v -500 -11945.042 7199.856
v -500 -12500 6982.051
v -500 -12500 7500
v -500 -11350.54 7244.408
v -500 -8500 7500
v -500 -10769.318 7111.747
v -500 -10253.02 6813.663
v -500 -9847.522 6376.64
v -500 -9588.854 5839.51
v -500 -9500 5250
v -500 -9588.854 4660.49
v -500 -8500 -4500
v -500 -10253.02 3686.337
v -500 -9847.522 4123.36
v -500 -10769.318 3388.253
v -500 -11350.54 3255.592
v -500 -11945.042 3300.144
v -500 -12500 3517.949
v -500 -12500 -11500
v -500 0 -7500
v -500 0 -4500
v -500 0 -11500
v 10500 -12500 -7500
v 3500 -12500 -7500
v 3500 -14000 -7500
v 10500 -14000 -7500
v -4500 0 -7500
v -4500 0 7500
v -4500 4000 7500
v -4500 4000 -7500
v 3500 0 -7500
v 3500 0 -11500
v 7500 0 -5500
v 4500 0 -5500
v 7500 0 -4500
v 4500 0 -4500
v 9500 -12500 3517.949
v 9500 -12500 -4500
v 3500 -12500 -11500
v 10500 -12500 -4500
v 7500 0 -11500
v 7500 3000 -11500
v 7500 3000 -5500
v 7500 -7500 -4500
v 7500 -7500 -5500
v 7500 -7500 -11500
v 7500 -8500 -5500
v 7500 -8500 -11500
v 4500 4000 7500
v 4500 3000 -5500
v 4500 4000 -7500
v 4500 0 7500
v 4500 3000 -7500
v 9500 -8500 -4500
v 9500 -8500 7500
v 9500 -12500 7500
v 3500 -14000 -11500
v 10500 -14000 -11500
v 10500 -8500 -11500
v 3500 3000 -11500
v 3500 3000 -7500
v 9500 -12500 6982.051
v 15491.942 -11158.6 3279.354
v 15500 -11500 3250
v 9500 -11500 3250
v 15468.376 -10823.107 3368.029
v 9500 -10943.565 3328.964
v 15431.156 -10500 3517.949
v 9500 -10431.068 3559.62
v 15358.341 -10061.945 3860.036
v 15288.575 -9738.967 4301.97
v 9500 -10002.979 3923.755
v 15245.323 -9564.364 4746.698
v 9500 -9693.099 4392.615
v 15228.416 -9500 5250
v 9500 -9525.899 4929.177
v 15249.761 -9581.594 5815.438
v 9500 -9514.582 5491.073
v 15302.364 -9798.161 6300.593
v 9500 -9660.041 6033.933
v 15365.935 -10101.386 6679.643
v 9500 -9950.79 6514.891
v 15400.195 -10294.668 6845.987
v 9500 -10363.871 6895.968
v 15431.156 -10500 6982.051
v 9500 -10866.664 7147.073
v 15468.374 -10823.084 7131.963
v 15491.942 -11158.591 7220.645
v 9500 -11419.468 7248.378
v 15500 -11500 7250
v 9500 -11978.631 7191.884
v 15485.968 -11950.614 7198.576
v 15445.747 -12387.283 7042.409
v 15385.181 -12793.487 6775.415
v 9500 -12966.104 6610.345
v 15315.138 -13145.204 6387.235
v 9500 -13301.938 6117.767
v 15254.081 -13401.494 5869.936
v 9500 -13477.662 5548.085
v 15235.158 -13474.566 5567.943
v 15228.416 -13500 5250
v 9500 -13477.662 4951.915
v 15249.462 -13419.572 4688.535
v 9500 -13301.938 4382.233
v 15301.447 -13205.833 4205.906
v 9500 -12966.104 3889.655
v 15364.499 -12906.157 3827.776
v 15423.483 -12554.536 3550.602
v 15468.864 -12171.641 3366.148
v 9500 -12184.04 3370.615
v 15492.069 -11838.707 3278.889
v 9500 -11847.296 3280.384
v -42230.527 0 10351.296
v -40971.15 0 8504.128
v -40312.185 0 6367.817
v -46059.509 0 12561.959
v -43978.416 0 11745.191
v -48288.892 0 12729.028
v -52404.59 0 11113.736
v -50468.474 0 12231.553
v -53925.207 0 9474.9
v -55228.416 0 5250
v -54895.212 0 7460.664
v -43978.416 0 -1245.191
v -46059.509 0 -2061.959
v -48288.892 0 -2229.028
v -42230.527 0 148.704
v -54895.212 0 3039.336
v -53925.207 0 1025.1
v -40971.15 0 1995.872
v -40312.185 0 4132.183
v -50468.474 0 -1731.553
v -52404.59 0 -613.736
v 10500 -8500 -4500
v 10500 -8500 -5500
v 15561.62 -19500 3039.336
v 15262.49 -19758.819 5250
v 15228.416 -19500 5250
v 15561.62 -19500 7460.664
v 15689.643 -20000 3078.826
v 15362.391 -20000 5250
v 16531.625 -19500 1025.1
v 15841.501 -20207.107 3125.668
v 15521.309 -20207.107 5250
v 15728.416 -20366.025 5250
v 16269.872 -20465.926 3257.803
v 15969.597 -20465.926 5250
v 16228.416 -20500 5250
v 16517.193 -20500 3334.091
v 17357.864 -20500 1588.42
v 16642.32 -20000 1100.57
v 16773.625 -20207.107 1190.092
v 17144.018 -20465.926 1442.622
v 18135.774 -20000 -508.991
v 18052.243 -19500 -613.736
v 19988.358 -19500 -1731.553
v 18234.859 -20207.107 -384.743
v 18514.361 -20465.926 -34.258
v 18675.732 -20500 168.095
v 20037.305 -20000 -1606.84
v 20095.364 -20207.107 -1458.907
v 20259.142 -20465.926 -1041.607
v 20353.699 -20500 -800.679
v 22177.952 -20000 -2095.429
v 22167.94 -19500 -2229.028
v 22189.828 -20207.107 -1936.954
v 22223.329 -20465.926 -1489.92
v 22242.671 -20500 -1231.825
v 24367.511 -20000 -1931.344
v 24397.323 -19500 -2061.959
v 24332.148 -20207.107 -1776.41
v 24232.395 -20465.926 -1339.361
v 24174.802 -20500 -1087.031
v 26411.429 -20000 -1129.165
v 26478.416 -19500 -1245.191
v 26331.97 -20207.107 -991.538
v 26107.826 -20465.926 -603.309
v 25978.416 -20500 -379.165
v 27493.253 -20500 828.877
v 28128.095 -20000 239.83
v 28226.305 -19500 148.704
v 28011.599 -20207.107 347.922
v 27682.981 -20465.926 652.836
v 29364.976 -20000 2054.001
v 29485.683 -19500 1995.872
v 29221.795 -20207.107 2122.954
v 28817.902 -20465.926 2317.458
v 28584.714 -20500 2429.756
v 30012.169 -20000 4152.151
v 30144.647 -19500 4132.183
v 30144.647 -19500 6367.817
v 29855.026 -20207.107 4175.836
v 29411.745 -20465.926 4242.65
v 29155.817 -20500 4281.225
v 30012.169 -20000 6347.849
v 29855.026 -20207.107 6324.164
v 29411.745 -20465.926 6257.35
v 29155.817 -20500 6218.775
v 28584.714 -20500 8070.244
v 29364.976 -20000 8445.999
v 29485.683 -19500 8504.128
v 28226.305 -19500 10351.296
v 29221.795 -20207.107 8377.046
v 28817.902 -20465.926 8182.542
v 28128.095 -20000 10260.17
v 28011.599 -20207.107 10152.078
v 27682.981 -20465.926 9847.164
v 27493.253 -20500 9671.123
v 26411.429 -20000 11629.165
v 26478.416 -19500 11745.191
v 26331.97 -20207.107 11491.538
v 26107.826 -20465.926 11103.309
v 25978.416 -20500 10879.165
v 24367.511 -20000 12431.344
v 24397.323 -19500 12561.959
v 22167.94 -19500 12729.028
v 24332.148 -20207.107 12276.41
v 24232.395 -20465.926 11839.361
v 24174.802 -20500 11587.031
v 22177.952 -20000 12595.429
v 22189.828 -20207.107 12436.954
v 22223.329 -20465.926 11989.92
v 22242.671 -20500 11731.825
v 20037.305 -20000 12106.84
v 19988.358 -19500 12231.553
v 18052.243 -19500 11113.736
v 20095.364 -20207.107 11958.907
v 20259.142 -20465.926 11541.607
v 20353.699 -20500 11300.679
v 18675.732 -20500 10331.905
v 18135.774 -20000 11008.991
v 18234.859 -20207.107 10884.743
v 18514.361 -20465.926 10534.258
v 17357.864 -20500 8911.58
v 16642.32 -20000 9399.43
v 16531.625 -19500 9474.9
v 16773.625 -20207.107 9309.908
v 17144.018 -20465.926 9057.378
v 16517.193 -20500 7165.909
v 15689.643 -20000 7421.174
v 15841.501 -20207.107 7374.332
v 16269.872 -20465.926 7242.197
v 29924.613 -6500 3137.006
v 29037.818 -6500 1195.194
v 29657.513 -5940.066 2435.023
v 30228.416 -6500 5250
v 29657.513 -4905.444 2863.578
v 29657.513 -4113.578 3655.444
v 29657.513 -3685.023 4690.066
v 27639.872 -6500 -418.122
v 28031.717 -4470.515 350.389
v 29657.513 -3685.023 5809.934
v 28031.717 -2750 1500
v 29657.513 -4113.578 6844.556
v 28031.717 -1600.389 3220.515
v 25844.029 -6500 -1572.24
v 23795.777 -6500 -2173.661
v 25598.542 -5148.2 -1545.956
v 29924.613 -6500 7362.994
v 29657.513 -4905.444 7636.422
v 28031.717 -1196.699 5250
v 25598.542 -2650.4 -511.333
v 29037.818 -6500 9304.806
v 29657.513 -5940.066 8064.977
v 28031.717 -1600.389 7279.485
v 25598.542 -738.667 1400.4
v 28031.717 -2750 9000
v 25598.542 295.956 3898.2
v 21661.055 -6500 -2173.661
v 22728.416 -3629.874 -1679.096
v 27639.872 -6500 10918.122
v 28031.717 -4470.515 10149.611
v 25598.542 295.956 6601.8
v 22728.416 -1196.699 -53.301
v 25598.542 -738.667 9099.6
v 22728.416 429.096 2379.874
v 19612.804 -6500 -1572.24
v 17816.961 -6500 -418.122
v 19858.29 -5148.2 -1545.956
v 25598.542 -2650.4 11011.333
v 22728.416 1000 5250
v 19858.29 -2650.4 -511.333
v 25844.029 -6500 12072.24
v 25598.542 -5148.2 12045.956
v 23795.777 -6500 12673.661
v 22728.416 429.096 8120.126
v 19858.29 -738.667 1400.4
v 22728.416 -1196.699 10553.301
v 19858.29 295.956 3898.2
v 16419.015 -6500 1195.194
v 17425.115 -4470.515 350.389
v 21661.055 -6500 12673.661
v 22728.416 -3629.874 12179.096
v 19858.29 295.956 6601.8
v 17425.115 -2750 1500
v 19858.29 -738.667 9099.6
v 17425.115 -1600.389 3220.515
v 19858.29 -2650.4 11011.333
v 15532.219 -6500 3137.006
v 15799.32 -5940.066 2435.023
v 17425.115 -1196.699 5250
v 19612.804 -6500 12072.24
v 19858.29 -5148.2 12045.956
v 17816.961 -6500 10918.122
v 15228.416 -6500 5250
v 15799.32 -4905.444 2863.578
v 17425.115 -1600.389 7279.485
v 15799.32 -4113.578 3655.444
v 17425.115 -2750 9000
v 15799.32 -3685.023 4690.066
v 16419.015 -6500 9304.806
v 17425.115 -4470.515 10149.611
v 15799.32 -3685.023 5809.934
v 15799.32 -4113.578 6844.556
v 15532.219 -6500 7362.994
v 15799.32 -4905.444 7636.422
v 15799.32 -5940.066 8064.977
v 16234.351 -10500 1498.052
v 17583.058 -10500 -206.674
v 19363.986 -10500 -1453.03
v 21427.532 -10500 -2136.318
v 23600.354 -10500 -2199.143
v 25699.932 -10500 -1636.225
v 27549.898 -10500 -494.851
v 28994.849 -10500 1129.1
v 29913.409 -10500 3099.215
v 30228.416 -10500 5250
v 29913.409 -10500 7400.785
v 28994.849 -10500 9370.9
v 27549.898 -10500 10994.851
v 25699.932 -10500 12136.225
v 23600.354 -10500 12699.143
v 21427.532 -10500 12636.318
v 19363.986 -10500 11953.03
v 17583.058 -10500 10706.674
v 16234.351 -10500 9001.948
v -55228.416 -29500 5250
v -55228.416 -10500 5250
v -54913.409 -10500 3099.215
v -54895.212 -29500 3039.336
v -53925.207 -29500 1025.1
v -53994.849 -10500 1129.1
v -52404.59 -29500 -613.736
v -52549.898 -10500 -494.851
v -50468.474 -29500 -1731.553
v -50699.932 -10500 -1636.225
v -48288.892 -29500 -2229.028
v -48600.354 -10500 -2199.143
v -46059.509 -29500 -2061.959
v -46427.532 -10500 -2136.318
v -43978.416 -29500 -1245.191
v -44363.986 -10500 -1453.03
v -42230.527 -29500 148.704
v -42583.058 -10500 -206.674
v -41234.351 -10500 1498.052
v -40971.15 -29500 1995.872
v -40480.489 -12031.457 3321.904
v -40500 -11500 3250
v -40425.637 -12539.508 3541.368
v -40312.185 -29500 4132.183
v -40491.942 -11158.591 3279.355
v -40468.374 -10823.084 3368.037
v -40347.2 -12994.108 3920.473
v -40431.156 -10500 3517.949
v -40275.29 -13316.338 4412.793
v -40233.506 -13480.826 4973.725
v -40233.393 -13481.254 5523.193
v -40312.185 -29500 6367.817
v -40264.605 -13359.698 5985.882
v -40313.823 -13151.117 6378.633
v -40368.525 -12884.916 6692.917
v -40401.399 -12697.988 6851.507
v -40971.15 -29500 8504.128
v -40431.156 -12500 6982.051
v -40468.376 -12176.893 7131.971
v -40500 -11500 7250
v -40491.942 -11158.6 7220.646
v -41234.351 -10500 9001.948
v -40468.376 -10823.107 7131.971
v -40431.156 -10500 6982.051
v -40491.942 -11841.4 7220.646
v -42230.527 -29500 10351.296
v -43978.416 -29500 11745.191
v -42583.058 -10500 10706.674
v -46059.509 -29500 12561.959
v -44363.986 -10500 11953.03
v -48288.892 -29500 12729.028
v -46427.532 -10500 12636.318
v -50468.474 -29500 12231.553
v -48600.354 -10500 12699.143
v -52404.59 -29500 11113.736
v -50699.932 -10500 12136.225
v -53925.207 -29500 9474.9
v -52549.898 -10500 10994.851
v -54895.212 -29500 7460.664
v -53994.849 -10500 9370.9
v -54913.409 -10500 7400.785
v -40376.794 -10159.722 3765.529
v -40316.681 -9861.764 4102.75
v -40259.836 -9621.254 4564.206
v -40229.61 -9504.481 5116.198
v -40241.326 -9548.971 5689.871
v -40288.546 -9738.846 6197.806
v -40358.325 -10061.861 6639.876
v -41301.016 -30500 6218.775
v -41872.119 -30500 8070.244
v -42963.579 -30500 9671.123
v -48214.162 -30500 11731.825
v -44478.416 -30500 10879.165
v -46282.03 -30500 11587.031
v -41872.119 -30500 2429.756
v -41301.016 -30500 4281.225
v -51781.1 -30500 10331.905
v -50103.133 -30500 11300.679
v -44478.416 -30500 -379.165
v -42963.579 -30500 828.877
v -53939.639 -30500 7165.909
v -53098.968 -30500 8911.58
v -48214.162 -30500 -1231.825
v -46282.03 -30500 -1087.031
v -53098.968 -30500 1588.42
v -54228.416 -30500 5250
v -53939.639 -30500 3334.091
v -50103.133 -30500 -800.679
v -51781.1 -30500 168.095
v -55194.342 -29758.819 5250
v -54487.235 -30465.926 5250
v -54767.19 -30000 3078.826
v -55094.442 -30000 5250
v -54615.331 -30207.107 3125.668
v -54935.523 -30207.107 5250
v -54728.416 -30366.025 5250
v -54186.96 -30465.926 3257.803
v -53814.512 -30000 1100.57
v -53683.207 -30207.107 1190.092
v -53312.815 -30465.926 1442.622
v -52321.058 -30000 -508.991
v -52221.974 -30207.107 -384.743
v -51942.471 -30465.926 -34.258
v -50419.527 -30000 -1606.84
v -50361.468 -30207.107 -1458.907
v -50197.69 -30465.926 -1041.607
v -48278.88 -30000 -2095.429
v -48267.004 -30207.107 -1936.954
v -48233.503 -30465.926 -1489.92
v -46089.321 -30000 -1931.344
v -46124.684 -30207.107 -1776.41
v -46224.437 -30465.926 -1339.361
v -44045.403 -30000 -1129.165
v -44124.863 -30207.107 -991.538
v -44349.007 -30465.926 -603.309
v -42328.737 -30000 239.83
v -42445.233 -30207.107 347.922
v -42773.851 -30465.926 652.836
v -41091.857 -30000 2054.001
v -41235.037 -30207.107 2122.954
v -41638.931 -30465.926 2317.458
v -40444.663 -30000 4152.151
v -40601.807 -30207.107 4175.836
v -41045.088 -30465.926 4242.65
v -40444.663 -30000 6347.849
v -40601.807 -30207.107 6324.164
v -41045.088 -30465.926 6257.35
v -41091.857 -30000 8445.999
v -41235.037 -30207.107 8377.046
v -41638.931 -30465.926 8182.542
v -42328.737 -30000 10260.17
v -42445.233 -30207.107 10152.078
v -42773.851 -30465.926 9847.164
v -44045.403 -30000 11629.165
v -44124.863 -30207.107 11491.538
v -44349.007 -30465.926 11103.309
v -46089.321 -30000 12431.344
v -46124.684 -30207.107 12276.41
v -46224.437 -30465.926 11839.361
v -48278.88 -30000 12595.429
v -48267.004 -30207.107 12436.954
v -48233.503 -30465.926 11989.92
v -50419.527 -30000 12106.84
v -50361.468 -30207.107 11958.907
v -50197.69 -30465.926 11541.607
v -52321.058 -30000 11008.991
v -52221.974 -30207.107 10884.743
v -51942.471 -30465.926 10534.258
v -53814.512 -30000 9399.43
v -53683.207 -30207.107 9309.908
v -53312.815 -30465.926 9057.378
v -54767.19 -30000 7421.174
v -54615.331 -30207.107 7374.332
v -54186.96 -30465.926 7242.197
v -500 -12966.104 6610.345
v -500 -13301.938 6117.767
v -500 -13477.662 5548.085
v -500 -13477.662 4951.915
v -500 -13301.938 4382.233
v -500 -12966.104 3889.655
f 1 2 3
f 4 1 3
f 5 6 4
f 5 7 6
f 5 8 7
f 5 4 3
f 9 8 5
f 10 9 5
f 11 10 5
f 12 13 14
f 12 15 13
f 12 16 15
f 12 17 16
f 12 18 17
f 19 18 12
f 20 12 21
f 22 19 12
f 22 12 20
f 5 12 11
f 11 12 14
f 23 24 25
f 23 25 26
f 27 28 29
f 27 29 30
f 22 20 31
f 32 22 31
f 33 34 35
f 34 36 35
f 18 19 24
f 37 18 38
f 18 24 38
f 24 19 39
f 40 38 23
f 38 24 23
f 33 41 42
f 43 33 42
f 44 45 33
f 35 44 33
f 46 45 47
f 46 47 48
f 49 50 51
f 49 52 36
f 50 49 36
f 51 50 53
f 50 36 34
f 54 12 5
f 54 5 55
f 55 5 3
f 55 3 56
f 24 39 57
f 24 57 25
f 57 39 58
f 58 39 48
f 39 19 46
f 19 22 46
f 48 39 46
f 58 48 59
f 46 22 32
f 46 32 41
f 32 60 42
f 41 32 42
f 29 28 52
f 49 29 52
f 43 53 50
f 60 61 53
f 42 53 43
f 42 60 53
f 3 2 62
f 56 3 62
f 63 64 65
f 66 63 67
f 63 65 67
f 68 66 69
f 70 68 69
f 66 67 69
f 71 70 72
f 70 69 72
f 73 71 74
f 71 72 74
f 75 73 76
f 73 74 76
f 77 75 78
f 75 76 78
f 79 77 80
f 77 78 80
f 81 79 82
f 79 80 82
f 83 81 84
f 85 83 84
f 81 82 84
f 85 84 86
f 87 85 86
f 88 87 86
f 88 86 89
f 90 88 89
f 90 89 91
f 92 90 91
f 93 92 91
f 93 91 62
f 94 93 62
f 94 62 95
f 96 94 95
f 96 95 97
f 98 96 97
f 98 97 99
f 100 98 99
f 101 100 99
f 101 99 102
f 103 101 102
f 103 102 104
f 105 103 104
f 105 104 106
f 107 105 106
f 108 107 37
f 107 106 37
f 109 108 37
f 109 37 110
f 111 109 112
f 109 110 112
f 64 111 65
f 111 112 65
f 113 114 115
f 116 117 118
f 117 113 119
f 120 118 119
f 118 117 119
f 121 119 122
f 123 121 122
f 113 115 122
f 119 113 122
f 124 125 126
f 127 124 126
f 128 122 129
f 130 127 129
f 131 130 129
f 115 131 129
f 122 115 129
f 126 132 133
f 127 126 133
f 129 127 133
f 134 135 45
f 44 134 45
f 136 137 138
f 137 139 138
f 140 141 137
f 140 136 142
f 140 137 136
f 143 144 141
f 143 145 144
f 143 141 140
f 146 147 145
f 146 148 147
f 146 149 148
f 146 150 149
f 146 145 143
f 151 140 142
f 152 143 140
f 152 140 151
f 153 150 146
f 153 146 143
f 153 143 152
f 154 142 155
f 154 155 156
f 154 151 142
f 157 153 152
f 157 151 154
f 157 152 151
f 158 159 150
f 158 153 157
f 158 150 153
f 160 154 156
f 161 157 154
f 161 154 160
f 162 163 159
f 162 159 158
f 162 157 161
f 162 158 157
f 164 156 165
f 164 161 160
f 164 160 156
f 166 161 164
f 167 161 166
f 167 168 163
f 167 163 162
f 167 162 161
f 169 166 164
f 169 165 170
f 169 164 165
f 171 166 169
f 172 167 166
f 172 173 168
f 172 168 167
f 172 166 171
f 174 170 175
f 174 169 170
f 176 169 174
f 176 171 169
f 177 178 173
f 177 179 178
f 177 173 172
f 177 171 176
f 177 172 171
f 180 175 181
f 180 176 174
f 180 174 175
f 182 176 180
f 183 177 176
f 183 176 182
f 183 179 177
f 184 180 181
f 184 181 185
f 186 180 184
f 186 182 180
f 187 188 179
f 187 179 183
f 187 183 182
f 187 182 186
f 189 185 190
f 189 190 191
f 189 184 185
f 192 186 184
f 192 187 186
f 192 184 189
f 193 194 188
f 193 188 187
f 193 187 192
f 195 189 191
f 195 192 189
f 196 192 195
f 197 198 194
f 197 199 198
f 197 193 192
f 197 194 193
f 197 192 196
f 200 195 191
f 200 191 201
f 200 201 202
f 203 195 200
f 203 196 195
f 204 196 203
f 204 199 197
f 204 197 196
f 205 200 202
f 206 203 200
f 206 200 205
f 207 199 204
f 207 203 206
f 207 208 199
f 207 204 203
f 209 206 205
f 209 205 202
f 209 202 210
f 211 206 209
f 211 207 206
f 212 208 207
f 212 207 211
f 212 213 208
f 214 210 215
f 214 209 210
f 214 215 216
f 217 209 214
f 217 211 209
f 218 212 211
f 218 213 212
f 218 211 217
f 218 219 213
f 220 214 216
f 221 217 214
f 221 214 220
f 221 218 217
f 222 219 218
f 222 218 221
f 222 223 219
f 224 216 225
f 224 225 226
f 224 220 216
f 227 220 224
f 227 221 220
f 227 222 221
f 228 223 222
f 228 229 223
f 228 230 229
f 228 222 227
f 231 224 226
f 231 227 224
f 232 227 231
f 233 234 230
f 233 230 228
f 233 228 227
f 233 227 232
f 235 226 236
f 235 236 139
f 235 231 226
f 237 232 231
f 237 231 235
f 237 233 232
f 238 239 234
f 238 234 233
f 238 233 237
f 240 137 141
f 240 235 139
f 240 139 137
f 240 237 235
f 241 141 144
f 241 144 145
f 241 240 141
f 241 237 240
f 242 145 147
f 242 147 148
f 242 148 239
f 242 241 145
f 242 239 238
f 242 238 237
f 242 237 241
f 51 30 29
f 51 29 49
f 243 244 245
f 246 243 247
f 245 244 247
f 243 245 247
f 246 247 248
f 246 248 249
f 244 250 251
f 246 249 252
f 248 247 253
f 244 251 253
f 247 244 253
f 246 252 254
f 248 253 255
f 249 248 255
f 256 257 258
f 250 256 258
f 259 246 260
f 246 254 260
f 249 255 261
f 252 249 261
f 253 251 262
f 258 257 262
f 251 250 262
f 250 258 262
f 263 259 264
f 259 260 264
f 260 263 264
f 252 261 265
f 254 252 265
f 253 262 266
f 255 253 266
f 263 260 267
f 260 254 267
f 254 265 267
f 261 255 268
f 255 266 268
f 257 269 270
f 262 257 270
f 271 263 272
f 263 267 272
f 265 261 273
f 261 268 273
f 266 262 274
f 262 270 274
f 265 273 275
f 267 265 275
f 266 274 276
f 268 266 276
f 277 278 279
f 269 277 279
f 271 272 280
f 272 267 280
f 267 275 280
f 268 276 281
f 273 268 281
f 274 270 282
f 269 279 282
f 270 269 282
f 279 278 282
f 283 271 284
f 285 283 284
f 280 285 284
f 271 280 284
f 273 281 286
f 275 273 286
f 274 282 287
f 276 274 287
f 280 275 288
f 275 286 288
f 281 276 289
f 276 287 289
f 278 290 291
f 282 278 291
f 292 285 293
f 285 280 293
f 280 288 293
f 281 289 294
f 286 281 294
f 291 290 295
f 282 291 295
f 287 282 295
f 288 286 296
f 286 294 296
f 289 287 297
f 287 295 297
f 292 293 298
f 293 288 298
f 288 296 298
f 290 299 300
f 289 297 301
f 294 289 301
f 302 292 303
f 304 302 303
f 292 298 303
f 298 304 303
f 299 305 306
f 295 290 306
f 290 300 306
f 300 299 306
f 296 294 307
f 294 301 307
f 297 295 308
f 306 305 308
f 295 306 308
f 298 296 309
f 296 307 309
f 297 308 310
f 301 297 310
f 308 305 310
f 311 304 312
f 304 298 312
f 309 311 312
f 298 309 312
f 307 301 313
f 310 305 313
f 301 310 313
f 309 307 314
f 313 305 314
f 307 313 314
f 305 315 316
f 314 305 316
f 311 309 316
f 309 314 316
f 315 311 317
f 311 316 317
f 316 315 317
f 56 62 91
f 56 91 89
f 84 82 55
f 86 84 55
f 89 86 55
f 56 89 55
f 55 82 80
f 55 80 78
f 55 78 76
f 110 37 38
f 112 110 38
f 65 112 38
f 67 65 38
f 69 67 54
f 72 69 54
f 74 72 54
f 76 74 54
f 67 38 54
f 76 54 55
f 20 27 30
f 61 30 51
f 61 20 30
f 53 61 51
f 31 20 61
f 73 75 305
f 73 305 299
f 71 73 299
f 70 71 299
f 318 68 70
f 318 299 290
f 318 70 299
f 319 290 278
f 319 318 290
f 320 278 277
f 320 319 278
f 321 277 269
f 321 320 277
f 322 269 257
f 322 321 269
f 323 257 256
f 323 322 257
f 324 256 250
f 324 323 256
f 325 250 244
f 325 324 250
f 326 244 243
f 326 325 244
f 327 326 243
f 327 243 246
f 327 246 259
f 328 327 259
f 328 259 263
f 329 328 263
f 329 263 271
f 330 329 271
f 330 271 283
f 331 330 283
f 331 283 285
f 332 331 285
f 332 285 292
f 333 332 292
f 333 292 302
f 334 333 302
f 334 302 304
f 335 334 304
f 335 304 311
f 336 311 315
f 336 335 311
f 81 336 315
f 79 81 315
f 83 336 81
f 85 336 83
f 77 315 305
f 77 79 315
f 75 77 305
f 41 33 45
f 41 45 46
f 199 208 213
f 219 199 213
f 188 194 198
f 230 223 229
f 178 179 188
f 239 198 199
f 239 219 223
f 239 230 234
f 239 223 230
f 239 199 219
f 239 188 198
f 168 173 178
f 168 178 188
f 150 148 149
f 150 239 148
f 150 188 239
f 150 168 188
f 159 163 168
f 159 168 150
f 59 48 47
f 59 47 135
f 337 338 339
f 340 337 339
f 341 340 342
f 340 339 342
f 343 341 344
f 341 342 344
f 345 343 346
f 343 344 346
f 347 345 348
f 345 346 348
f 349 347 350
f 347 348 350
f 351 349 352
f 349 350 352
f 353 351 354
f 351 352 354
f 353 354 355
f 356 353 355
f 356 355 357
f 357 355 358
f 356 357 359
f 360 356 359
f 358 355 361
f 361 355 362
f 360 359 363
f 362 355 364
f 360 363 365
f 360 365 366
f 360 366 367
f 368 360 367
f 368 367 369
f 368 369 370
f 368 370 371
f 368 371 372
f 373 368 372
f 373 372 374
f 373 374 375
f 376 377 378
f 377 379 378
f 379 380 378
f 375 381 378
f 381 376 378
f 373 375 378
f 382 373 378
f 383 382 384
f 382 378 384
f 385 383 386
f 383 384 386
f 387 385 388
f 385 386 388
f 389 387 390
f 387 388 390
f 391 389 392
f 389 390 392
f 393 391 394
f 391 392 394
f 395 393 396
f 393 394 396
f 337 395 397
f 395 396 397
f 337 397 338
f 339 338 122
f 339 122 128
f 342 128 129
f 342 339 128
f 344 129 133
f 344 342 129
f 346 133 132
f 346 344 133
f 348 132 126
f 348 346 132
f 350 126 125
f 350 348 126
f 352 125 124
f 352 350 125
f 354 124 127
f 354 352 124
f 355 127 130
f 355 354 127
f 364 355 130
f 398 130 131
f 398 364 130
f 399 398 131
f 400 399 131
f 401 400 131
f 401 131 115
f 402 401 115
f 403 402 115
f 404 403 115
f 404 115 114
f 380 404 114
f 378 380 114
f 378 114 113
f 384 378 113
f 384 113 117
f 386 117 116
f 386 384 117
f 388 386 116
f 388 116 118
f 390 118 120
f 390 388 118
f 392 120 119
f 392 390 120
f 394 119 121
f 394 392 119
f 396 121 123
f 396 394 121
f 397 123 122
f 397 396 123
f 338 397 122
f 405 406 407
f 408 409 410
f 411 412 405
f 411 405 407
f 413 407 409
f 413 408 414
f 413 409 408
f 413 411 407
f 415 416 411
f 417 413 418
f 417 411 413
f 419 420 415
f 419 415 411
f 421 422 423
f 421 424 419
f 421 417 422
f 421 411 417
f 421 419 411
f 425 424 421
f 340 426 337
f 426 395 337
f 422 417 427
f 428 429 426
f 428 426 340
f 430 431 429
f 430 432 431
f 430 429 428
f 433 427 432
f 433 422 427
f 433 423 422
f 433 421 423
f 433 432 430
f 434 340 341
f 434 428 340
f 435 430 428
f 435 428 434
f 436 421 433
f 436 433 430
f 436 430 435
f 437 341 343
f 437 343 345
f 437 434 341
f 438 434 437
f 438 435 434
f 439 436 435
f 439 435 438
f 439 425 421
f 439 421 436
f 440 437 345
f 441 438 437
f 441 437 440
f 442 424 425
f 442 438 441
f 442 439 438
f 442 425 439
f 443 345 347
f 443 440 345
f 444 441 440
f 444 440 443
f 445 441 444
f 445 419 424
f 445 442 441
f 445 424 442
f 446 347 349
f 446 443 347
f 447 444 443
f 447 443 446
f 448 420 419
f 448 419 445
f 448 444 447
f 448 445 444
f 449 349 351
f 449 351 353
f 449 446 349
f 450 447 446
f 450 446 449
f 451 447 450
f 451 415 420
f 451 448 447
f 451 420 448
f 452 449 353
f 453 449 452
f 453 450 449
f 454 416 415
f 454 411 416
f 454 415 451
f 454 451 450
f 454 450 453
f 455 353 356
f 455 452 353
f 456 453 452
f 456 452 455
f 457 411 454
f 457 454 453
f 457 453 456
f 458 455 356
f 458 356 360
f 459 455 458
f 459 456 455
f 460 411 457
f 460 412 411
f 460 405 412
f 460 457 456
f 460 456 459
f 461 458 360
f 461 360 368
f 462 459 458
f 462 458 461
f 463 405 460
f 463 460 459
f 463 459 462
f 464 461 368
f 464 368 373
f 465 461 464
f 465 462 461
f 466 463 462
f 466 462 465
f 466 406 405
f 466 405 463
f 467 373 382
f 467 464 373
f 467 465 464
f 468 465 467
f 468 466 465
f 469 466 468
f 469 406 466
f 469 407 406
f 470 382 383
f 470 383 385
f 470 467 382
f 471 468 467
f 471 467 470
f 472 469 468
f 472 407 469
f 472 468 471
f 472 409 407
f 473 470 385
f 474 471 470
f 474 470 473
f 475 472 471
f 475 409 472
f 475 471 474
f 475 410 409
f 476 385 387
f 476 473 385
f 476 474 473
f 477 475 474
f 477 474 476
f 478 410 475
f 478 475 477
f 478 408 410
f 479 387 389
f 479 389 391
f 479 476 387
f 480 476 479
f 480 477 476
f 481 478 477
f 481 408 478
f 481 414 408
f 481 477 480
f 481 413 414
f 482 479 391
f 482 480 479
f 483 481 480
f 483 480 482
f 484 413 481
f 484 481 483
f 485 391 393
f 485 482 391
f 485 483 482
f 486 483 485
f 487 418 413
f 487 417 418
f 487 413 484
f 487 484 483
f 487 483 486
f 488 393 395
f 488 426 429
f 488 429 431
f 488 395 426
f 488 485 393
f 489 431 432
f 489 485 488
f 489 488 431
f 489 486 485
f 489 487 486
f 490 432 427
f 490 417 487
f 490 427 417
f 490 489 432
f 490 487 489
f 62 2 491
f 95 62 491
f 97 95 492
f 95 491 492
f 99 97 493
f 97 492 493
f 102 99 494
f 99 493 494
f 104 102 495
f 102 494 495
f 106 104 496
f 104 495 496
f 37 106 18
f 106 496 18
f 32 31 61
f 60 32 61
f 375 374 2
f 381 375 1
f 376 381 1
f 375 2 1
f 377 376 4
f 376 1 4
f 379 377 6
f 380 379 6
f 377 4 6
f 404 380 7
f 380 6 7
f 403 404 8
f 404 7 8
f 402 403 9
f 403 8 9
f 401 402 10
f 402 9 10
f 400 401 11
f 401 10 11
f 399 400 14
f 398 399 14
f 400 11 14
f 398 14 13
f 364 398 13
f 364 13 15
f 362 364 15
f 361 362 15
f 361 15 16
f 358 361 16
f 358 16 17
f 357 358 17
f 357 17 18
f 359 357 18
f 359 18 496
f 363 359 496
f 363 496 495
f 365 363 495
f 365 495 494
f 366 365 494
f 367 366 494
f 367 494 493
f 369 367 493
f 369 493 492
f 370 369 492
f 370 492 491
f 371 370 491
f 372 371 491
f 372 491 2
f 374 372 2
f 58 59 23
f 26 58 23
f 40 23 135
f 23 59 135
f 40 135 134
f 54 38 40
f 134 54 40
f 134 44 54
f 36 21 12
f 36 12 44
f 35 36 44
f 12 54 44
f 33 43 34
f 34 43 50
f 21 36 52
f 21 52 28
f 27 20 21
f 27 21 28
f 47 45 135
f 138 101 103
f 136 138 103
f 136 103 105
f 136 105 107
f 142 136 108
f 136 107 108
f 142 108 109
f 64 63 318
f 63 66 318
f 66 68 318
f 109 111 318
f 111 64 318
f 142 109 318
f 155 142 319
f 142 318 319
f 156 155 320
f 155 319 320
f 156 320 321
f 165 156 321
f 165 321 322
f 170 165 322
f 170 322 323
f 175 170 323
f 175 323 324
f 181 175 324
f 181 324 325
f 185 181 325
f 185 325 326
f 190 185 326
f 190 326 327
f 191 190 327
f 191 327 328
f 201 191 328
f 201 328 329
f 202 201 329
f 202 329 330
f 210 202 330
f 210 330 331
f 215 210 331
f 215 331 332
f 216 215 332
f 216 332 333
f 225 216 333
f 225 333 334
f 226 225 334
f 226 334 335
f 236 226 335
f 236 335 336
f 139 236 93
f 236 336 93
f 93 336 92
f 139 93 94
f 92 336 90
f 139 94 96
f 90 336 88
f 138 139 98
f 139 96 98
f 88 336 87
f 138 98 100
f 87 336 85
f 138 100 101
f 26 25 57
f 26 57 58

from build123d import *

# Parameters (mm, degrees)
SKETCH1_W                 = 9000
SKETCH1_H                 = 15000
BOSS_EXTRUDE1_DEPTH       = 4000
SKETCH2_W                 = 3000
SKETCH2_H                 = 3000
SKETCH2_W_2               = 1000
BOSS_EXTRUDE2_DEPTH       = 4000
BOSS_EXTRUDE2_DEPTH_BACK  = 2000
SKETCH3_W                 = 11000
SKETCH3_H                 = 7000
BOSS_EXTRUDE3_DEPTH       = 12500
SKETCH4_W                 = 7000
SKETCH4_H                 = 4000
BOSS_EXTRUDE4_DEPTH       = 1500
SKETCH5_W                 = 10000
SKETCH5_H                 = 4000
BOSS_EXTRUDE5_DEPTH       = 12000
SKETCH6_R                 = 2000
BOSS_EXTRUDE6_DEPTH       = 6000
SKETCH9_R                 = 7500
BOSS_EXTRUDE8_DEPTH       = 10000
BOSS_EXTRUDE8_DEPTH_BACK  = 4000
REVOLVE5_ANGLE            = 180
BOSS_EXTRUDE9_DEPTH       = 40000
SKETCH16_R                = 7500
BOSS_EXTRUDE11_DEPTH      = 20000
BOSS_EXTRUDE11_DEPTH_BACK = 10500
BOSS_EXTRUDE12_DEPTH      = 10000
FILLET1_R                 = 1000
FILLET2_R                 = 1000
SKETCH19_W                = 3000
SKETCH19_H                = 6000
CUT_EXTRUDE1_DEPTH        = 8500
CUT_EXTRUDE2_DEPTH        = 6001
CUT_EXTRUDE2_DEPTH_BACK   = 18251.0000001


with BuildPart() as part:
    # Sketch1 → Boss-Extrude1 (new body)
    with BuildSketch(Plane(origin=(0, 0, 0), x_dir=(1, 0, 0), z_dir=(0, 1, 0))):
        Rectangle(SKETCH1_W, SKETCH1_H)
    extrude(amount=BOSS_EXTRUDE1_DEPTH)

    # Sketch2 → Boss-Extrude2 (add, two sides)
    with BuildSketch(Plane(origin=(0, 0, -7500), x_dir=(-1, 0, 0), z_dir=(0, 0, -1))) as boss_extrude2_sk:
        with Locations((-6000, 1500)):
            Rectangle(SKETCH2_W, SKETCH2_H)
        with Locations((-4000, 1500)):
            Rectangle(SKETCH2_W_2, SKETCH2_H)
    extrude(amount=BOSS_EXTRUDE2_DEPTH)
    extrude(boss_extrude2_sk.sketch, amount=-BOSS_EXTRUDE2_DEPTH_BACK)

    # Sketch3 → Boss-Extrude3 (add)
    with BuildSketch(Plane.XZ):
        with Locations((5000, -8000)):
            Rectangle(SKETCH3_W, SKETCH3_H)
    extrude(amount=BOSS_EXTRUDE3_DEPTH)

    # Sketch4 → Boss-Extrude4 (add)
    with BuildSketch(Plane.XZ.offset(12500)):
        with Locations((7000, -9500)):
            Rectangle(SKETCH4_W, SKETCH4_H)
    extrude(amount=BOSS_EXTRUDE4_DEPTH)

    # Sketch5 → Boss-Extrude5 (add)
    with BuildSketch(Plane.XY.offset(-4500)):
        with Locations((4500, -10500)):
            Rectangle(SKETCH5_W, SKETCH5_H)
    extrude(amount=BOSS_EXTRUDE5_DEPTH)

    # Sketch6 → Boss-Extrude6 (add)
    with BuildSketch(Plane(origin=(9500, 0, 0), x_dir=(0, 0, -1), z_dir=(1, 0, 0))):
        with Locations((-5250, -11500)):
            Circle(SKETCH6_R)
    extrude(amount=BOSS_EXTRUDE6_DEPTH)

    # Sketch9 → Boss-Extrude8 (add, two sides)
    with BuildSketch(Plane(origin=(0, -10500, 0), x_dir=(-1, 0, 0), z_dir=(0, -1, 0))) as boss_extrude8_sk:
        with Locations((-22728.4161474, -5250)):
            Circle(SKETCH9_R)
    extrude(amount=BOSS_EXTRUDE8_DEPTH)
    extrude(boss_extrude8_sk.sketch, amount=-BOSS_EXTRUDE8_DEPTH_BACK)

    # Sketch10 → Revolve5 (revolve)
    with BuildSketch(Plane(origin=(0, -6500, 0), x_dir=(1, 0, 0), z_dir=(0, 1, 0))):
        with BuildLine():
            Line((15228.4161474, -5250), (30228.4161474, -5250))
            ThreePointArc((30228.4161474, -5250), (22728.4161474, 2250), (15228.4161474, -5250))
        make_face()
    revolve(axis=Axis((15228.4161474, -6500, 5250), (1, 0, 0)), revolution_arc=REVOLVE5_ANGLE)

    # Sketch12 → Boss-Extrude9 (add)
    with BuildSketch(Plane.ZY.offset(500)):
        with BuildLine():
            ThreePointArc((3517.949192431, -12500), (5250, -13500), (6982.050807569, -12500))
            ThreePointArc((6982.050807569, -12500), (5250, -9500), (3517.949192431, -12500))
        make_face()
    extrude(amount=BOSS_EXTRUDE9_DEPTH)

    # Sketch16 → Boss-Extrude11 (add, two sides)
    with BuildSketch(Plane(origin=(0, -10500, 0), x_dir=(-1, 0, 0), z_dir=(0, -1, 0))) as boss_extrude11_sk:
        with Locations((47728.4161474, -5250)):
            Circle(SKETCH16_R)
    extrude(amount=BOSS_EXTRUDE11_DEPTH)
    extrude(boss_extrude11_sk.sketch, amount=-BOSS_EXTRUDE11_DEPTH_BACK)

    # Sketch18 → Boss-Extrude12 (add)
    with BuildSketch(Plane(origin=(-500, 0, 0), x_dir=(0, 0, -1), z_dir=(1, 0, 0))):
        with BuildLine():
            Line((-3517.949192431, -12500), (-6982.050807569, -12500))
            ThreePointArc((-6982.050807569, -12500), (-5250, -13500), (-3517.949192431, -12500))
        make_face()
    extrude(amount=BOSS_EXTRUDE12_DEPTH)

    # Fillet1
    fillet1_edges = [part.edges().sort_by_distance(p)[0] for p in [
        (30228.4161474, -20500, 5250),
    ]]
    fillet(fillet1_edges, radius=FILLET1_R)

    # Fillet2
    fillet2_edges = [part.edges().sort_by_distance(p)[0] for p in [
        (-40228.4161474, -30500, 5250),
    ]]
    fillet(fillet2_edges, radius=FILLET2_R)

    # Sketch19 → Cut-Extrude1 (cut)
    with BuildSketch(Plane(origin=(0, 0, 0), x_dir=(1, 0, 0), z_dir=(0, 1, 0))):
        with Locations((9000, 8500)):
            Rectangle(SKETCH19_W, SKETCH19_H)
    extrude(amount=-CUT_EXTRUDE1_DEPTH, mode=Mode.SUBTRACT)

    # Sketch20 → Cut-Extrude2 (cut, two sides)
    with BuildSketch(Plane(origin=(0, 0, -5500), x_dir=(-1, 0, 0), z_dir=(0, 0, -1))) as cut_extrude2_sk:
        Polygon((-10500, 0), (-10500, -8500), (-7500, -7500), (-7500, 0), align=None)
    extrude(amount=CUT_EXTRUDE2_DEPTH, mode=Mode.SUBTRACT)
    extrude(cut_extrude2_sk.sketch, amount=-CUT_EXTRUDE2_DEPTH_BACK, mode=Mode.SUBTRACT)


solid = part.part
